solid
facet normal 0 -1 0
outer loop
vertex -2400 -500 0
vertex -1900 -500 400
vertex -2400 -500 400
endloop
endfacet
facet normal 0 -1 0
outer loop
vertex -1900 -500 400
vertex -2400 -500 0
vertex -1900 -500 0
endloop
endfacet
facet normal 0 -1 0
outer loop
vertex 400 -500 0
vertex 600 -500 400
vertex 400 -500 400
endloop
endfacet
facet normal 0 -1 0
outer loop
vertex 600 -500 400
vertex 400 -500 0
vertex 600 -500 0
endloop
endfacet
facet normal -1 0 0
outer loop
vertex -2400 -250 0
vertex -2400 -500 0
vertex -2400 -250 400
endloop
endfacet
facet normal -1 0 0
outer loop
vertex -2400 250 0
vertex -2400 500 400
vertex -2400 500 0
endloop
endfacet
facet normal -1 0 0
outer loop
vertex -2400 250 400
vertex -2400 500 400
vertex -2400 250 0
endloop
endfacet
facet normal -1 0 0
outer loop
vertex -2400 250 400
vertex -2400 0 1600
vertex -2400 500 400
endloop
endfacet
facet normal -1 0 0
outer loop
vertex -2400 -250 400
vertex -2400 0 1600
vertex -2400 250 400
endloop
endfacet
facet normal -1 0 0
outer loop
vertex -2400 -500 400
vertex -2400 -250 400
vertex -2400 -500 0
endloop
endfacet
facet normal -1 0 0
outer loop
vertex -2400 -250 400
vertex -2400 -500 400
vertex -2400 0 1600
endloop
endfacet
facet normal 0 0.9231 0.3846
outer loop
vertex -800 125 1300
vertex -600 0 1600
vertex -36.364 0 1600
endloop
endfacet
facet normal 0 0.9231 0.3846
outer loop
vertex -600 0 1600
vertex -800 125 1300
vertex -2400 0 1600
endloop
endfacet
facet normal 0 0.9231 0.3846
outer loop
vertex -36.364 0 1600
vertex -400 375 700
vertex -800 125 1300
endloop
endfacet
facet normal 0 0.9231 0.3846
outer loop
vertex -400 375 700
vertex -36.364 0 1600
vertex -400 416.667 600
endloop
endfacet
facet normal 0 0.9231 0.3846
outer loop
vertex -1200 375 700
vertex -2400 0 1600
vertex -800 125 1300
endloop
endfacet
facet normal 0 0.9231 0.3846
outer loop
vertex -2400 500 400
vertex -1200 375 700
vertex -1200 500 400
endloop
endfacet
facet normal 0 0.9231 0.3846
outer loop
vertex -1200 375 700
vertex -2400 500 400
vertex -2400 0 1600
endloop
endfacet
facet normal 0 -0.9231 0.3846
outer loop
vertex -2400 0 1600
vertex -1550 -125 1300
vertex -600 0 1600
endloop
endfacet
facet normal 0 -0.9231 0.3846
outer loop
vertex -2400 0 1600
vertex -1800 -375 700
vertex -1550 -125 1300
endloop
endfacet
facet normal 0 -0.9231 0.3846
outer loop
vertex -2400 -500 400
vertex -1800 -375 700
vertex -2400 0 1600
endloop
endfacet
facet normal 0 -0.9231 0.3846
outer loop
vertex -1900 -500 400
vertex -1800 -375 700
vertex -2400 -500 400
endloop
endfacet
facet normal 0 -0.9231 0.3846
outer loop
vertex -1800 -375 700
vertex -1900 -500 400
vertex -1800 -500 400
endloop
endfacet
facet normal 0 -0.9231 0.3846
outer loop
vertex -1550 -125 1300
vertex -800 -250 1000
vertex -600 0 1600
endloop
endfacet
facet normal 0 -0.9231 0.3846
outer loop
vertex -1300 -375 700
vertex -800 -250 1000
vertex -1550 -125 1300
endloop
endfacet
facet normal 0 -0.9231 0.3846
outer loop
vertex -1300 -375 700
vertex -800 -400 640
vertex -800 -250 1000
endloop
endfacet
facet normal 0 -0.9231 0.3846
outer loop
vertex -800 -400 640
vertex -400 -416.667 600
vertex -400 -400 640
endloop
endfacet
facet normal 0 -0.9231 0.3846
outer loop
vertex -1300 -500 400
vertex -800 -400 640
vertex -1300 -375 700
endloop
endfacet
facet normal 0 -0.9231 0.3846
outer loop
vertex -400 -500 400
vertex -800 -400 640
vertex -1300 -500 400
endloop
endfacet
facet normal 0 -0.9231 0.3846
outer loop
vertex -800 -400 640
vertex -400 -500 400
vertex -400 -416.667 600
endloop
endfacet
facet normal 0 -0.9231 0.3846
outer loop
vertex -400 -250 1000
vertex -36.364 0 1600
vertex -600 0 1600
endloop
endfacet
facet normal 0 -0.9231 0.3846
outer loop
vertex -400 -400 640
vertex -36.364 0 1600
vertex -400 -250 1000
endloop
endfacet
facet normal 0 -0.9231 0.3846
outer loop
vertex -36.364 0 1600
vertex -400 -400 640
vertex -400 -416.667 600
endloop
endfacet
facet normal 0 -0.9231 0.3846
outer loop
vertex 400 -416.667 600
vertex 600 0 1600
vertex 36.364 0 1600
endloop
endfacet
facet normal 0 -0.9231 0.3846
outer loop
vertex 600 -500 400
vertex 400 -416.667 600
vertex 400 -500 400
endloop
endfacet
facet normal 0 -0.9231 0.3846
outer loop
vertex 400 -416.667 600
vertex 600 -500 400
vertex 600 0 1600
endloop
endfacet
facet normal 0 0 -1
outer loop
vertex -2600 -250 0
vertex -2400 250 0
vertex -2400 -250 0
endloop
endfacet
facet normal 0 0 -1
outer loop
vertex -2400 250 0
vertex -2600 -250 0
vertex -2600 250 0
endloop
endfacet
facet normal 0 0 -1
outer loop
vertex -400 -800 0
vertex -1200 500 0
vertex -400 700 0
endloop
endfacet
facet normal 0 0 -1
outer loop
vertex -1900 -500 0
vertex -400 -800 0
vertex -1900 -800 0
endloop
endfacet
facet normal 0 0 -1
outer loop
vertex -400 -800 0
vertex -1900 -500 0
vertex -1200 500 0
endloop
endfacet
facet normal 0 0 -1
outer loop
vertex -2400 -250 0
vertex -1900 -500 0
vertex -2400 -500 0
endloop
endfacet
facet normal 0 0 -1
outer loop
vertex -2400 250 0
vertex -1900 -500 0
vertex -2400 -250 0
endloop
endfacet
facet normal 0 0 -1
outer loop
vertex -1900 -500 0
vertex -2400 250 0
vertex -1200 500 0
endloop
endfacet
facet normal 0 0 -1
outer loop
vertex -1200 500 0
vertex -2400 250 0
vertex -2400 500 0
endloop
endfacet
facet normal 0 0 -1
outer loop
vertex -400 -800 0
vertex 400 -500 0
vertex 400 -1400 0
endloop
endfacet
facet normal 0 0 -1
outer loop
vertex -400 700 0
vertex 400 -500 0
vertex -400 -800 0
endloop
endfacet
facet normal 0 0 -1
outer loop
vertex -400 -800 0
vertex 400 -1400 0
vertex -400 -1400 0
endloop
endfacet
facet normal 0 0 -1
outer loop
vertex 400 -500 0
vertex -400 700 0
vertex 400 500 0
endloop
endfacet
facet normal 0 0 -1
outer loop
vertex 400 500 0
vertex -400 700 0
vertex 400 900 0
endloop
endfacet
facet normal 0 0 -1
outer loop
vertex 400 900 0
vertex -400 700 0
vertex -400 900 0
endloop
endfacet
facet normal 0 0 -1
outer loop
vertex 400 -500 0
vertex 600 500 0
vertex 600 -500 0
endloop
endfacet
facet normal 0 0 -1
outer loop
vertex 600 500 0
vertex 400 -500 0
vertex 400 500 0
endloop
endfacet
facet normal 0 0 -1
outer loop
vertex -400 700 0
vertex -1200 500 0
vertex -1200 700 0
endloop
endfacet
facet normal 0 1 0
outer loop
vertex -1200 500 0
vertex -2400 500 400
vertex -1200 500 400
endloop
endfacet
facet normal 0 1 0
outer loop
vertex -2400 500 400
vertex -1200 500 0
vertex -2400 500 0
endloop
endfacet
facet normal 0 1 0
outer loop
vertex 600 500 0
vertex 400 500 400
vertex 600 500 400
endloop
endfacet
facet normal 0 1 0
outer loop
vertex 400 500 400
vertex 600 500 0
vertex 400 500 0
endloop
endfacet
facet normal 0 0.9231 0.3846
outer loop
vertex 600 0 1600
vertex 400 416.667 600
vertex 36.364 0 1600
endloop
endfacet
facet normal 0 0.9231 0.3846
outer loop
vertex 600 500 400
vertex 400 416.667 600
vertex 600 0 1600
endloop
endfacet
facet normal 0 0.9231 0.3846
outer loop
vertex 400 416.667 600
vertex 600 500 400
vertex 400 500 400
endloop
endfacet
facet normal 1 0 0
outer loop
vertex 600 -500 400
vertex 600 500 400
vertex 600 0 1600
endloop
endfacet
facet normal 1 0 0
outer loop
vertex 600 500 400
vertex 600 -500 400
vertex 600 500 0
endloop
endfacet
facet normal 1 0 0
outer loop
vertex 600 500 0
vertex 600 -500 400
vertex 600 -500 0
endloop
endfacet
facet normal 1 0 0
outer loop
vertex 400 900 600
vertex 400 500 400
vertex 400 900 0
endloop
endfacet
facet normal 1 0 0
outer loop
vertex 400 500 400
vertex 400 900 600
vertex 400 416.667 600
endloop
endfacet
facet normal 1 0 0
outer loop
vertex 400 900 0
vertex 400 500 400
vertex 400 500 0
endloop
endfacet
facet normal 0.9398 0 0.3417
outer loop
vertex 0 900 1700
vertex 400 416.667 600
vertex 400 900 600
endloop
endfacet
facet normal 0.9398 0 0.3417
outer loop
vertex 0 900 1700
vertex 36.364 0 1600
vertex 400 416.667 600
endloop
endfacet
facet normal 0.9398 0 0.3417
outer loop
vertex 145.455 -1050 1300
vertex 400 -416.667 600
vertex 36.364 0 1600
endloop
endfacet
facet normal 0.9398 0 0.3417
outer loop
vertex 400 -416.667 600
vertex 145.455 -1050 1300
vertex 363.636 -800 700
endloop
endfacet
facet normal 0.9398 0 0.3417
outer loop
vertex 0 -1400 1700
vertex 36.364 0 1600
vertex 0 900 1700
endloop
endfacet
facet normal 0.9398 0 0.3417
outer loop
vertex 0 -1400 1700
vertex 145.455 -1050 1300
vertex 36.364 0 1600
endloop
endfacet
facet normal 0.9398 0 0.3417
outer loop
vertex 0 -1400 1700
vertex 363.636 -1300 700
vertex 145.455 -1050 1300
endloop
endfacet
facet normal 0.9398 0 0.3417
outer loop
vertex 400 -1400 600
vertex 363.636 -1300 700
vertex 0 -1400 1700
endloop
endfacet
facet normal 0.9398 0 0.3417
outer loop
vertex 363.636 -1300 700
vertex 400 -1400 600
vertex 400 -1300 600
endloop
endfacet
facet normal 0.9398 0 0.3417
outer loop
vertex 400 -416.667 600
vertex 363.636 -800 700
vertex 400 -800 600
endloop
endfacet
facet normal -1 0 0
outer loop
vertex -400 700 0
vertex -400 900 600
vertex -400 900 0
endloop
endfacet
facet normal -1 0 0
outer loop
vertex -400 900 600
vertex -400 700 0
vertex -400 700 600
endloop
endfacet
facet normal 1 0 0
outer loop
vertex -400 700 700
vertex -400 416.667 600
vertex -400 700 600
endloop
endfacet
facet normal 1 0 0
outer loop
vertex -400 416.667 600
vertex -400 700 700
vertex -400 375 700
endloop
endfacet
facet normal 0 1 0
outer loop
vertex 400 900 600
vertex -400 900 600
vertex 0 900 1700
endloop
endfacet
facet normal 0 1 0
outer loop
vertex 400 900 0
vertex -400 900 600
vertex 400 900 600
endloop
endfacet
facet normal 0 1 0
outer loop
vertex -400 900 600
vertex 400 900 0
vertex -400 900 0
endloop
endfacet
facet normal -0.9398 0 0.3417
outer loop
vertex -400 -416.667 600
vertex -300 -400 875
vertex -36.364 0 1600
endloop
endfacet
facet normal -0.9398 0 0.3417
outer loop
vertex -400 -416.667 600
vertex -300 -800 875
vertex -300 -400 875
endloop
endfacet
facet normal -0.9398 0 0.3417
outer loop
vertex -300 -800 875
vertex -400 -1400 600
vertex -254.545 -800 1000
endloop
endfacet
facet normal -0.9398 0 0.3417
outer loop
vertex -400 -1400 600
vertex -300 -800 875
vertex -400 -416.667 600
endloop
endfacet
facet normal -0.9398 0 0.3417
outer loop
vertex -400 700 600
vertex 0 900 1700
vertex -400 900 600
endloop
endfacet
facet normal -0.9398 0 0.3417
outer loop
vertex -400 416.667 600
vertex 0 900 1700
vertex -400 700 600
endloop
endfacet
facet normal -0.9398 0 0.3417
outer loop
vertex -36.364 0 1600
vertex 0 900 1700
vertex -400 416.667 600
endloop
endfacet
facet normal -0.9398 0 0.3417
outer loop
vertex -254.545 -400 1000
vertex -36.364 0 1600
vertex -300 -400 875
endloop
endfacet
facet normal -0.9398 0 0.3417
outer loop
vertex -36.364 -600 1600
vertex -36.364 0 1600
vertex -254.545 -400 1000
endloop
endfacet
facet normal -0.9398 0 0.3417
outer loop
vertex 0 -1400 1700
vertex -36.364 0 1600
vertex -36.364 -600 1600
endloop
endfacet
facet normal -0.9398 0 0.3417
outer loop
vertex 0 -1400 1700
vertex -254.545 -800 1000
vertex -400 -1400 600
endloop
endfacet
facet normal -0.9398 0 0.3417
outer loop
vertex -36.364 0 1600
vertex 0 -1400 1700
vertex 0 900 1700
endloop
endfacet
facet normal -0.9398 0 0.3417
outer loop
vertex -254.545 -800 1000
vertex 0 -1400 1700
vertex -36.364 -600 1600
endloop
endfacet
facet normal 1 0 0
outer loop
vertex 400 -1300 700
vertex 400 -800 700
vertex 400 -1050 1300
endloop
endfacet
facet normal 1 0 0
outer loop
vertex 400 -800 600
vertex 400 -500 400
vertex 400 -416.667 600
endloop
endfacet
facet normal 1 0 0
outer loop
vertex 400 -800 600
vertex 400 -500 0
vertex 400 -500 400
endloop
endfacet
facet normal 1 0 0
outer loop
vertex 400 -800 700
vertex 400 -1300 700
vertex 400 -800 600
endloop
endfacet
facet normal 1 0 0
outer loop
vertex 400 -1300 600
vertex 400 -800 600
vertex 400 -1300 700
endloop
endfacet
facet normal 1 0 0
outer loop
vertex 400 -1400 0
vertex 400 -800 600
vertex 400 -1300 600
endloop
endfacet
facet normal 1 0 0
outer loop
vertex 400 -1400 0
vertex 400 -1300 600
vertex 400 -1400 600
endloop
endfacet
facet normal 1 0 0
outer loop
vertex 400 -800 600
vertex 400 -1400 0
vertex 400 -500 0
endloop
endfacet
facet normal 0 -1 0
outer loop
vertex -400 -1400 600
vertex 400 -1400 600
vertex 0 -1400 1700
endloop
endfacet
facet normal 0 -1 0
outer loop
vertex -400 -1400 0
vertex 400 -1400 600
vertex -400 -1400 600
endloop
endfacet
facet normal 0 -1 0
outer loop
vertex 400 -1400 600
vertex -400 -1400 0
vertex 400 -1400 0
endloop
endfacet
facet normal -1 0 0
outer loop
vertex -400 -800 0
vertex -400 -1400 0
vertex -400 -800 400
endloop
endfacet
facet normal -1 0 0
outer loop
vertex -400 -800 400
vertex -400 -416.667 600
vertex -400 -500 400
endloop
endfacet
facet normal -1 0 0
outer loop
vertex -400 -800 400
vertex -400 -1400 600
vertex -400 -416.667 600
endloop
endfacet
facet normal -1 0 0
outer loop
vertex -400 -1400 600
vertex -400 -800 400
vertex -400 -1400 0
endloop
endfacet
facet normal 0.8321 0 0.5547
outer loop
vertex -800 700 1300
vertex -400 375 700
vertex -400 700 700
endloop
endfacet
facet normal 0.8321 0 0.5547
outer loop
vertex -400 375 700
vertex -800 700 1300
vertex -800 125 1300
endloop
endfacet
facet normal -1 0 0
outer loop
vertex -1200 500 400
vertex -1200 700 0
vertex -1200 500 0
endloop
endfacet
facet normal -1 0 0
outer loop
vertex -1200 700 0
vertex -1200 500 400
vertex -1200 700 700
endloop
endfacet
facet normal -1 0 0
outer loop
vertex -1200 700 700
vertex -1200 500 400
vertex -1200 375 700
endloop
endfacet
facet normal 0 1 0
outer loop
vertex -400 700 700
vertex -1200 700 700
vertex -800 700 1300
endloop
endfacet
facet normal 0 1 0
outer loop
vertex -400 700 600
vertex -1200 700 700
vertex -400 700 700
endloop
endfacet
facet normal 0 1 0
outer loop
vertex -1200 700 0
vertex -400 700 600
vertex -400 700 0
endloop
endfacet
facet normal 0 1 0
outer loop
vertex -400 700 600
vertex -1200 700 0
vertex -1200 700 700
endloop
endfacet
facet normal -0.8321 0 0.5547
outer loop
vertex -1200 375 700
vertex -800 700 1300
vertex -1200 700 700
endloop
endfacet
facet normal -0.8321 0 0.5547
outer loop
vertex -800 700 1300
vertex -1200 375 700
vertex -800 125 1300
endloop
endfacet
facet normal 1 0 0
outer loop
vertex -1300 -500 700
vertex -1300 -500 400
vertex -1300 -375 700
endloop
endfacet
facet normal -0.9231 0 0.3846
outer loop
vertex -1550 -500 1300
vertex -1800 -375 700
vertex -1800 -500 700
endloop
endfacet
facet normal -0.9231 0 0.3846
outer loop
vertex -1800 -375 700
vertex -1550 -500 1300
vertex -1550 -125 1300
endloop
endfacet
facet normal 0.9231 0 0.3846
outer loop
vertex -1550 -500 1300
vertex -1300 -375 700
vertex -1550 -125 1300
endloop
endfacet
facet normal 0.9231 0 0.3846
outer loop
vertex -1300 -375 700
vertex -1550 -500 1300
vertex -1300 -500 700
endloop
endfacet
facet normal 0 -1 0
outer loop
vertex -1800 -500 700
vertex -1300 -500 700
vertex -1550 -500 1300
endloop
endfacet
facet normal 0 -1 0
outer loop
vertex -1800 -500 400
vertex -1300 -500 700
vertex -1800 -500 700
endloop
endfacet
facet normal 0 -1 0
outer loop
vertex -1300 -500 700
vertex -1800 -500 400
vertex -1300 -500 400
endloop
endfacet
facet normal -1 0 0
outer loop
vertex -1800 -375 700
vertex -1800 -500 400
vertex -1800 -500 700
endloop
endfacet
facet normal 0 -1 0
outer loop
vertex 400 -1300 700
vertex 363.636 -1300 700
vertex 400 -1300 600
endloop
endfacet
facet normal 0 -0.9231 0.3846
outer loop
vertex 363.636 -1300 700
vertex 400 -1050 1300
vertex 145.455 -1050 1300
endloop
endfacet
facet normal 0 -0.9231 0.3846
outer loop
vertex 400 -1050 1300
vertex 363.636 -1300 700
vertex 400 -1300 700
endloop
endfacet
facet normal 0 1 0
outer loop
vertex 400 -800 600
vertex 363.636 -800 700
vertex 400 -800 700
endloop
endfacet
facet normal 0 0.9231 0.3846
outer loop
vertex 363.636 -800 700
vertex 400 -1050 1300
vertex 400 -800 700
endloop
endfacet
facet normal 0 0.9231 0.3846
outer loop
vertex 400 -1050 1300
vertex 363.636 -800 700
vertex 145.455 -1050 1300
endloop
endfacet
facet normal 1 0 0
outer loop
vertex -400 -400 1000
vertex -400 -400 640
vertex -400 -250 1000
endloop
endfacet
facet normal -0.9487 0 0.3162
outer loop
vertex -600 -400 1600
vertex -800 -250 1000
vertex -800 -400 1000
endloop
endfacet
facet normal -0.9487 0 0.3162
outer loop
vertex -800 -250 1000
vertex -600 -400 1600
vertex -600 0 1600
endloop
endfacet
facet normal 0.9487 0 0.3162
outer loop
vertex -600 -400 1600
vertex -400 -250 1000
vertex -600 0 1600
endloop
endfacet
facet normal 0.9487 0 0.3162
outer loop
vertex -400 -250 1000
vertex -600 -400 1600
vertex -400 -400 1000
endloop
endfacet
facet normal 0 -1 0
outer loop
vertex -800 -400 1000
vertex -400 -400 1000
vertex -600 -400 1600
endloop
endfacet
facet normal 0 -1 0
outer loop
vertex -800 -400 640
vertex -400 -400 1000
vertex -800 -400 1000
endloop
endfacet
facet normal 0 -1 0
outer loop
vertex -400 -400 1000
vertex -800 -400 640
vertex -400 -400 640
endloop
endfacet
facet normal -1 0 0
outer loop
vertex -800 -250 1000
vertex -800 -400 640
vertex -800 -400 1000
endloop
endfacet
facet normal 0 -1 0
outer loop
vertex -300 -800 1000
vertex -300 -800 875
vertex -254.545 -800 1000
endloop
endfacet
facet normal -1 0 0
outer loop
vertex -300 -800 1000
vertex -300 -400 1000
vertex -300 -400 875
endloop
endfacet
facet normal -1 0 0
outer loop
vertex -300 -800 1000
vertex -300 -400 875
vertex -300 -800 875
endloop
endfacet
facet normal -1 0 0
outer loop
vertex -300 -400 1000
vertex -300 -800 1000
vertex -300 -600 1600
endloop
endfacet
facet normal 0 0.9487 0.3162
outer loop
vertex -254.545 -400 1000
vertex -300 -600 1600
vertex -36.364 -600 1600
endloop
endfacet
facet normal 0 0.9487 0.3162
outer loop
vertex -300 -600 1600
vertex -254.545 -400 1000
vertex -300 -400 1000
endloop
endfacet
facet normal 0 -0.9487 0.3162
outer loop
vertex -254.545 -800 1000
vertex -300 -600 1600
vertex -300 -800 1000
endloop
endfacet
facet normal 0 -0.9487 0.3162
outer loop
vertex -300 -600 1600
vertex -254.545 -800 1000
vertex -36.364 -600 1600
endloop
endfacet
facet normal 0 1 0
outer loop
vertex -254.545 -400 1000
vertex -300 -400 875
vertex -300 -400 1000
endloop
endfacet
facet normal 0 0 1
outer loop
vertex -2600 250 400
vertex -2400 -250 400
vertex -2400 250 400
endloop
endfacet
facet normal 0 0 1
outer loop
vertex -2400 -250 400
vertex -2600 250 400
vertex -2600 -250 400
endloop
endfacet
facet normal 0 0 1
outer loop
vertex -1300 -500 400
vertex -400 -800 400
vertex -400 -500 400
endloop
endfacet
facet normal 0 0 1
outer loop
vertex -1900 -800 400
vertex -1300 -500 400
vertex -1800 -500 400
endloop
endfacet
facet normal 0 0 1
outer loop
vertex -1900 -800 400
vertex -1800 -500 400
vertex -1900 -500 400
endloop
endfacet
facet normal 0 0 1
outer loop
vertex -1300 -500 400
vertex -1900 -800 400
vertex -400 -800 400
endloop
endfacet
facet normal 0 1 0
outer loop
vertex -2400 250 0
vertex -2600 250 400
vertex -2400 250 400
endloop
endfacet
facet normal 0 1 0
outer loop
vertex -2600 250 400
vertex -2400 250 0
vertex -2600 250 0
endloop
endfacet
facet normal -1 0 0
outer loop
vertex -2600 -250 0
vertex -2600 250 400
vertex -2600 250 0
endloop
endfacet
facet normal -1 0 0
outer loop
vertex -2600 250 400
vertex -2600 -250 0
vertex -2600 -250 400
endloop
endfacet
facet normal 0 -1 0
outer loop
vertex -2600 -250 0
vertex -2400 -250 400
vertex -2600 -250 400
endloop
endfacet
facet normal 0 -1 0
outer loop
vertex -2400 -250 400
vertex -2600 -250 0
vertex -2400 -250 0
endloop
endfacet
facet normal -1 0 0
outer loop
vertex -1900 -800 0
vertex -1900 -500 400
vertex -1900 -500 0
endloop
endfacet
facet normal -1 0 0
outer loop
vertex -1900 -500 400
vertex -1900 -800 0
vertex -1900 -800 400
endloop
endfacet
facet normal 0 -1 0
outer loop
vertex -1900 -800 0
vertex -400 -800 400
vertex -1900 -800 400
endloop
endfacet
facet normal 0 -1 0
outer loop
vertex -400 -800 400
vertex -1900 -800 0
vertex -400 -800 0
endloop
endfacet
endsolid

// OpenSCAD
// Generated by Parametrix
ca_house_facePA_000 = [ [ -500.0000, 0.0000 ],[ 500.0000, 0.0000 ],[ 500.0000, 400.0000 ],[ 0.0000, 1600.0000 ],[ -500.0000, 400.0000 ],[ -500.0000, 0.0000 ] ];
cb_house_facePA_000 = [  0, 1, 2, 3, 4, 5 ];
a_house_facePA = concat(ca_house_facePA_000);
b_house_facePA = [cb_house_facePA_000];
ca_house_facePB_000 = [ [ -400.0000, 0.0000 ],[ 400.0000, 0.0000 ],[ 400.0000, 600.0000 ],[ 0.0000, 1700.0000 ],[ -400.0000, 600.0000 ],[ -400.0000, 0.0000 ] ];
cb_house_facePB_000 = [  0, 1, 2, 3, 4, 5 ];
a_house_facePB = concat(ca_house_facePB_000);
b_house_facePB = [cb_house_facePB_000];
ca_house_facePC_000 = [ [ -400.0000, 0.0000 ],[ 400.0000, 0.0000 ],[ 400.0000, 700.0000 ],[ 0.0000, 1300.0000 ],[ -400.0000, 700.0000 ],[ -400.0000, 0.0000 ] ];
cb_house_facePC_000 = [  0, 1, 2, 3, 4, 5 ];
a_house_facePC = concat(ca_house_facePC_000);
b_house_facePC = [cb_house_facePC_000];
ca_house_facePD_000 = [ [ -250.0000, 0.0000 ],[ 250.0000, 0.0000 ],[ 250.0000, 700.0000 ],[ 0.0000, 1300.0000 ],[ -250.0000, 700.0000 ],[ -250.0000, 0.0000 ] ];
cb_house_facePD_000 = [  0, 1, 2, 3, 4, 5 ];
a_house_facePD = concat(ca_house_facePD_000);
b_house_facePD = [cb_house_facePD_000];
ca_house_facePE_000 = [ [ -200.0000, 0.0000 ],[ 200.0000, 0.0000 ],[ 200.0000, 1000.0000 ],[ 0.0000, 1600.0000 ],[ -200.0000, 1000.0000 ],[ -200.0000, 0.0000 ] ];
cb_house_facePE_000 = [  0, 1, 2, 3, 4, 5 ];
a_house_facePE = concat(ca_house_facePE_000);
b_house_facePE = [cb_house_facePE_000];
ca_house_faceTerrasse_000 = [ [ -2400.0000, -250.0000 ],[ -2400.0000, 250.0000 ],[ -2600.0000, 250.0000 ],[ -2600.0000, -250.0000 ],[ -2400.0000, -250.0000 ] ];
cb_house_faceTerrasse_000 = [  0, 1, 2, 3, 4 ];
ca_house_faceTerrasse_001 = [ [ -400.0000, -500.0000 ],[ -1900.0000, -500.0000 ],[ -1900.0000, -800.0000 ],[ -400.0000, -800.0000 ],[ -400.0000, -500.0000 ] ];
cb_house_faceTerrasse_001 = [  5, 6, 7, 8, 9 ];
a_house_faceTerrasse = concat(ca_house_faceTerrasse_000, ca_house_faceTerrasse_001);
b_house_faceTerrasse = [cb_house_faceTerrasse_000, cb_house_faceTerrasse_001];

module subpax_house_pAw () {
	translate( [ 0, 0, 0 ])
		rotate( [ 90, 0, 270 ])
			   linear_extrude(height = 2400) polygon(a_house_facePA, b_house_facePA);
}

module subpax_house_pAe () {
	translate( [ 0, 0, 0 ])
		rotate( [ 90, 0, 90 ])
			   linear_extrude(height = 600) polygon(a_house_facePA, b_house_facePA);
}

module subpax_house_pBn () {
	translate( [ 0, 0, 0 ])
		rotate( [ 90, 0, 180 ])
			   linear_extrude(height = 900) polygon(a_house_facePB, b_house_facePB);
}

module subpax_house_pBs () {
	translate( [ 0, 0, 0 ])
		rotate( [ 90, 0, 0 ])
			   linear_extrude(height = 1400) polygon(a_house_facePB, b_house_facePB);
}

module subpax_house_pCn () {
	translate( [ -800, 0, 0 ])
		rotate( [ 90, 0, 180 ])
			   linear_extrude(height = 700) polygon(a_house_facePC, b_house_facePC);
}

module subpax_house_pD1s () {
	translate( [ -1550, 0, 0 ])
		rotate( [ 90, 0, 0 ])
			   linear_extrude(height = 500) polygon(a_house_facePD, b_house_facePD);
}

module subpax_house_pD2e () {
	translate( [ 0, -1050, 0 ])
		rotate( [ 90, 0, 90 ])
			   linear_extrude(height = 400) polygon(a_house_facePD, b_house_facePD);
}

module subpax_house_pE1s () {
	translate( [ -600, 0, 0 ])
		rotate( [ 90, 0, 0 ])
			   linear_extrude(height = 400) polygon(a_house_facePE, b_house_facePE);
}

module subpax_house_pE2w () {
	translate( [ 0, -600, 0 ])
		rotate( [ 90, 0, 270 ])
			   linear_extrude(height = 300) polygon(a_house_facePE, b_house_facePE);
}

module subpax_house_terras () {
	translate( [ 0, 0, 0 ])
		rotate( [ 0, 0, 0 ])
			   linear_extrude(height = 400) polygon(a_house_faceTerrasse, b_house_faceTerrasse);
}

module pax_house () {
	union () {
		subpax_house_pAw();
subpax_house_pAe();
subpax_house_pBn();
subpax_house_pBs();
subpax_house_pCn();
subpax_house_pD1s();
subpax_house_pD2e();
subpax_house_pE1s();
subpax_house_pE2w();
subpax_house_terras();
	}
}

pax_house();
